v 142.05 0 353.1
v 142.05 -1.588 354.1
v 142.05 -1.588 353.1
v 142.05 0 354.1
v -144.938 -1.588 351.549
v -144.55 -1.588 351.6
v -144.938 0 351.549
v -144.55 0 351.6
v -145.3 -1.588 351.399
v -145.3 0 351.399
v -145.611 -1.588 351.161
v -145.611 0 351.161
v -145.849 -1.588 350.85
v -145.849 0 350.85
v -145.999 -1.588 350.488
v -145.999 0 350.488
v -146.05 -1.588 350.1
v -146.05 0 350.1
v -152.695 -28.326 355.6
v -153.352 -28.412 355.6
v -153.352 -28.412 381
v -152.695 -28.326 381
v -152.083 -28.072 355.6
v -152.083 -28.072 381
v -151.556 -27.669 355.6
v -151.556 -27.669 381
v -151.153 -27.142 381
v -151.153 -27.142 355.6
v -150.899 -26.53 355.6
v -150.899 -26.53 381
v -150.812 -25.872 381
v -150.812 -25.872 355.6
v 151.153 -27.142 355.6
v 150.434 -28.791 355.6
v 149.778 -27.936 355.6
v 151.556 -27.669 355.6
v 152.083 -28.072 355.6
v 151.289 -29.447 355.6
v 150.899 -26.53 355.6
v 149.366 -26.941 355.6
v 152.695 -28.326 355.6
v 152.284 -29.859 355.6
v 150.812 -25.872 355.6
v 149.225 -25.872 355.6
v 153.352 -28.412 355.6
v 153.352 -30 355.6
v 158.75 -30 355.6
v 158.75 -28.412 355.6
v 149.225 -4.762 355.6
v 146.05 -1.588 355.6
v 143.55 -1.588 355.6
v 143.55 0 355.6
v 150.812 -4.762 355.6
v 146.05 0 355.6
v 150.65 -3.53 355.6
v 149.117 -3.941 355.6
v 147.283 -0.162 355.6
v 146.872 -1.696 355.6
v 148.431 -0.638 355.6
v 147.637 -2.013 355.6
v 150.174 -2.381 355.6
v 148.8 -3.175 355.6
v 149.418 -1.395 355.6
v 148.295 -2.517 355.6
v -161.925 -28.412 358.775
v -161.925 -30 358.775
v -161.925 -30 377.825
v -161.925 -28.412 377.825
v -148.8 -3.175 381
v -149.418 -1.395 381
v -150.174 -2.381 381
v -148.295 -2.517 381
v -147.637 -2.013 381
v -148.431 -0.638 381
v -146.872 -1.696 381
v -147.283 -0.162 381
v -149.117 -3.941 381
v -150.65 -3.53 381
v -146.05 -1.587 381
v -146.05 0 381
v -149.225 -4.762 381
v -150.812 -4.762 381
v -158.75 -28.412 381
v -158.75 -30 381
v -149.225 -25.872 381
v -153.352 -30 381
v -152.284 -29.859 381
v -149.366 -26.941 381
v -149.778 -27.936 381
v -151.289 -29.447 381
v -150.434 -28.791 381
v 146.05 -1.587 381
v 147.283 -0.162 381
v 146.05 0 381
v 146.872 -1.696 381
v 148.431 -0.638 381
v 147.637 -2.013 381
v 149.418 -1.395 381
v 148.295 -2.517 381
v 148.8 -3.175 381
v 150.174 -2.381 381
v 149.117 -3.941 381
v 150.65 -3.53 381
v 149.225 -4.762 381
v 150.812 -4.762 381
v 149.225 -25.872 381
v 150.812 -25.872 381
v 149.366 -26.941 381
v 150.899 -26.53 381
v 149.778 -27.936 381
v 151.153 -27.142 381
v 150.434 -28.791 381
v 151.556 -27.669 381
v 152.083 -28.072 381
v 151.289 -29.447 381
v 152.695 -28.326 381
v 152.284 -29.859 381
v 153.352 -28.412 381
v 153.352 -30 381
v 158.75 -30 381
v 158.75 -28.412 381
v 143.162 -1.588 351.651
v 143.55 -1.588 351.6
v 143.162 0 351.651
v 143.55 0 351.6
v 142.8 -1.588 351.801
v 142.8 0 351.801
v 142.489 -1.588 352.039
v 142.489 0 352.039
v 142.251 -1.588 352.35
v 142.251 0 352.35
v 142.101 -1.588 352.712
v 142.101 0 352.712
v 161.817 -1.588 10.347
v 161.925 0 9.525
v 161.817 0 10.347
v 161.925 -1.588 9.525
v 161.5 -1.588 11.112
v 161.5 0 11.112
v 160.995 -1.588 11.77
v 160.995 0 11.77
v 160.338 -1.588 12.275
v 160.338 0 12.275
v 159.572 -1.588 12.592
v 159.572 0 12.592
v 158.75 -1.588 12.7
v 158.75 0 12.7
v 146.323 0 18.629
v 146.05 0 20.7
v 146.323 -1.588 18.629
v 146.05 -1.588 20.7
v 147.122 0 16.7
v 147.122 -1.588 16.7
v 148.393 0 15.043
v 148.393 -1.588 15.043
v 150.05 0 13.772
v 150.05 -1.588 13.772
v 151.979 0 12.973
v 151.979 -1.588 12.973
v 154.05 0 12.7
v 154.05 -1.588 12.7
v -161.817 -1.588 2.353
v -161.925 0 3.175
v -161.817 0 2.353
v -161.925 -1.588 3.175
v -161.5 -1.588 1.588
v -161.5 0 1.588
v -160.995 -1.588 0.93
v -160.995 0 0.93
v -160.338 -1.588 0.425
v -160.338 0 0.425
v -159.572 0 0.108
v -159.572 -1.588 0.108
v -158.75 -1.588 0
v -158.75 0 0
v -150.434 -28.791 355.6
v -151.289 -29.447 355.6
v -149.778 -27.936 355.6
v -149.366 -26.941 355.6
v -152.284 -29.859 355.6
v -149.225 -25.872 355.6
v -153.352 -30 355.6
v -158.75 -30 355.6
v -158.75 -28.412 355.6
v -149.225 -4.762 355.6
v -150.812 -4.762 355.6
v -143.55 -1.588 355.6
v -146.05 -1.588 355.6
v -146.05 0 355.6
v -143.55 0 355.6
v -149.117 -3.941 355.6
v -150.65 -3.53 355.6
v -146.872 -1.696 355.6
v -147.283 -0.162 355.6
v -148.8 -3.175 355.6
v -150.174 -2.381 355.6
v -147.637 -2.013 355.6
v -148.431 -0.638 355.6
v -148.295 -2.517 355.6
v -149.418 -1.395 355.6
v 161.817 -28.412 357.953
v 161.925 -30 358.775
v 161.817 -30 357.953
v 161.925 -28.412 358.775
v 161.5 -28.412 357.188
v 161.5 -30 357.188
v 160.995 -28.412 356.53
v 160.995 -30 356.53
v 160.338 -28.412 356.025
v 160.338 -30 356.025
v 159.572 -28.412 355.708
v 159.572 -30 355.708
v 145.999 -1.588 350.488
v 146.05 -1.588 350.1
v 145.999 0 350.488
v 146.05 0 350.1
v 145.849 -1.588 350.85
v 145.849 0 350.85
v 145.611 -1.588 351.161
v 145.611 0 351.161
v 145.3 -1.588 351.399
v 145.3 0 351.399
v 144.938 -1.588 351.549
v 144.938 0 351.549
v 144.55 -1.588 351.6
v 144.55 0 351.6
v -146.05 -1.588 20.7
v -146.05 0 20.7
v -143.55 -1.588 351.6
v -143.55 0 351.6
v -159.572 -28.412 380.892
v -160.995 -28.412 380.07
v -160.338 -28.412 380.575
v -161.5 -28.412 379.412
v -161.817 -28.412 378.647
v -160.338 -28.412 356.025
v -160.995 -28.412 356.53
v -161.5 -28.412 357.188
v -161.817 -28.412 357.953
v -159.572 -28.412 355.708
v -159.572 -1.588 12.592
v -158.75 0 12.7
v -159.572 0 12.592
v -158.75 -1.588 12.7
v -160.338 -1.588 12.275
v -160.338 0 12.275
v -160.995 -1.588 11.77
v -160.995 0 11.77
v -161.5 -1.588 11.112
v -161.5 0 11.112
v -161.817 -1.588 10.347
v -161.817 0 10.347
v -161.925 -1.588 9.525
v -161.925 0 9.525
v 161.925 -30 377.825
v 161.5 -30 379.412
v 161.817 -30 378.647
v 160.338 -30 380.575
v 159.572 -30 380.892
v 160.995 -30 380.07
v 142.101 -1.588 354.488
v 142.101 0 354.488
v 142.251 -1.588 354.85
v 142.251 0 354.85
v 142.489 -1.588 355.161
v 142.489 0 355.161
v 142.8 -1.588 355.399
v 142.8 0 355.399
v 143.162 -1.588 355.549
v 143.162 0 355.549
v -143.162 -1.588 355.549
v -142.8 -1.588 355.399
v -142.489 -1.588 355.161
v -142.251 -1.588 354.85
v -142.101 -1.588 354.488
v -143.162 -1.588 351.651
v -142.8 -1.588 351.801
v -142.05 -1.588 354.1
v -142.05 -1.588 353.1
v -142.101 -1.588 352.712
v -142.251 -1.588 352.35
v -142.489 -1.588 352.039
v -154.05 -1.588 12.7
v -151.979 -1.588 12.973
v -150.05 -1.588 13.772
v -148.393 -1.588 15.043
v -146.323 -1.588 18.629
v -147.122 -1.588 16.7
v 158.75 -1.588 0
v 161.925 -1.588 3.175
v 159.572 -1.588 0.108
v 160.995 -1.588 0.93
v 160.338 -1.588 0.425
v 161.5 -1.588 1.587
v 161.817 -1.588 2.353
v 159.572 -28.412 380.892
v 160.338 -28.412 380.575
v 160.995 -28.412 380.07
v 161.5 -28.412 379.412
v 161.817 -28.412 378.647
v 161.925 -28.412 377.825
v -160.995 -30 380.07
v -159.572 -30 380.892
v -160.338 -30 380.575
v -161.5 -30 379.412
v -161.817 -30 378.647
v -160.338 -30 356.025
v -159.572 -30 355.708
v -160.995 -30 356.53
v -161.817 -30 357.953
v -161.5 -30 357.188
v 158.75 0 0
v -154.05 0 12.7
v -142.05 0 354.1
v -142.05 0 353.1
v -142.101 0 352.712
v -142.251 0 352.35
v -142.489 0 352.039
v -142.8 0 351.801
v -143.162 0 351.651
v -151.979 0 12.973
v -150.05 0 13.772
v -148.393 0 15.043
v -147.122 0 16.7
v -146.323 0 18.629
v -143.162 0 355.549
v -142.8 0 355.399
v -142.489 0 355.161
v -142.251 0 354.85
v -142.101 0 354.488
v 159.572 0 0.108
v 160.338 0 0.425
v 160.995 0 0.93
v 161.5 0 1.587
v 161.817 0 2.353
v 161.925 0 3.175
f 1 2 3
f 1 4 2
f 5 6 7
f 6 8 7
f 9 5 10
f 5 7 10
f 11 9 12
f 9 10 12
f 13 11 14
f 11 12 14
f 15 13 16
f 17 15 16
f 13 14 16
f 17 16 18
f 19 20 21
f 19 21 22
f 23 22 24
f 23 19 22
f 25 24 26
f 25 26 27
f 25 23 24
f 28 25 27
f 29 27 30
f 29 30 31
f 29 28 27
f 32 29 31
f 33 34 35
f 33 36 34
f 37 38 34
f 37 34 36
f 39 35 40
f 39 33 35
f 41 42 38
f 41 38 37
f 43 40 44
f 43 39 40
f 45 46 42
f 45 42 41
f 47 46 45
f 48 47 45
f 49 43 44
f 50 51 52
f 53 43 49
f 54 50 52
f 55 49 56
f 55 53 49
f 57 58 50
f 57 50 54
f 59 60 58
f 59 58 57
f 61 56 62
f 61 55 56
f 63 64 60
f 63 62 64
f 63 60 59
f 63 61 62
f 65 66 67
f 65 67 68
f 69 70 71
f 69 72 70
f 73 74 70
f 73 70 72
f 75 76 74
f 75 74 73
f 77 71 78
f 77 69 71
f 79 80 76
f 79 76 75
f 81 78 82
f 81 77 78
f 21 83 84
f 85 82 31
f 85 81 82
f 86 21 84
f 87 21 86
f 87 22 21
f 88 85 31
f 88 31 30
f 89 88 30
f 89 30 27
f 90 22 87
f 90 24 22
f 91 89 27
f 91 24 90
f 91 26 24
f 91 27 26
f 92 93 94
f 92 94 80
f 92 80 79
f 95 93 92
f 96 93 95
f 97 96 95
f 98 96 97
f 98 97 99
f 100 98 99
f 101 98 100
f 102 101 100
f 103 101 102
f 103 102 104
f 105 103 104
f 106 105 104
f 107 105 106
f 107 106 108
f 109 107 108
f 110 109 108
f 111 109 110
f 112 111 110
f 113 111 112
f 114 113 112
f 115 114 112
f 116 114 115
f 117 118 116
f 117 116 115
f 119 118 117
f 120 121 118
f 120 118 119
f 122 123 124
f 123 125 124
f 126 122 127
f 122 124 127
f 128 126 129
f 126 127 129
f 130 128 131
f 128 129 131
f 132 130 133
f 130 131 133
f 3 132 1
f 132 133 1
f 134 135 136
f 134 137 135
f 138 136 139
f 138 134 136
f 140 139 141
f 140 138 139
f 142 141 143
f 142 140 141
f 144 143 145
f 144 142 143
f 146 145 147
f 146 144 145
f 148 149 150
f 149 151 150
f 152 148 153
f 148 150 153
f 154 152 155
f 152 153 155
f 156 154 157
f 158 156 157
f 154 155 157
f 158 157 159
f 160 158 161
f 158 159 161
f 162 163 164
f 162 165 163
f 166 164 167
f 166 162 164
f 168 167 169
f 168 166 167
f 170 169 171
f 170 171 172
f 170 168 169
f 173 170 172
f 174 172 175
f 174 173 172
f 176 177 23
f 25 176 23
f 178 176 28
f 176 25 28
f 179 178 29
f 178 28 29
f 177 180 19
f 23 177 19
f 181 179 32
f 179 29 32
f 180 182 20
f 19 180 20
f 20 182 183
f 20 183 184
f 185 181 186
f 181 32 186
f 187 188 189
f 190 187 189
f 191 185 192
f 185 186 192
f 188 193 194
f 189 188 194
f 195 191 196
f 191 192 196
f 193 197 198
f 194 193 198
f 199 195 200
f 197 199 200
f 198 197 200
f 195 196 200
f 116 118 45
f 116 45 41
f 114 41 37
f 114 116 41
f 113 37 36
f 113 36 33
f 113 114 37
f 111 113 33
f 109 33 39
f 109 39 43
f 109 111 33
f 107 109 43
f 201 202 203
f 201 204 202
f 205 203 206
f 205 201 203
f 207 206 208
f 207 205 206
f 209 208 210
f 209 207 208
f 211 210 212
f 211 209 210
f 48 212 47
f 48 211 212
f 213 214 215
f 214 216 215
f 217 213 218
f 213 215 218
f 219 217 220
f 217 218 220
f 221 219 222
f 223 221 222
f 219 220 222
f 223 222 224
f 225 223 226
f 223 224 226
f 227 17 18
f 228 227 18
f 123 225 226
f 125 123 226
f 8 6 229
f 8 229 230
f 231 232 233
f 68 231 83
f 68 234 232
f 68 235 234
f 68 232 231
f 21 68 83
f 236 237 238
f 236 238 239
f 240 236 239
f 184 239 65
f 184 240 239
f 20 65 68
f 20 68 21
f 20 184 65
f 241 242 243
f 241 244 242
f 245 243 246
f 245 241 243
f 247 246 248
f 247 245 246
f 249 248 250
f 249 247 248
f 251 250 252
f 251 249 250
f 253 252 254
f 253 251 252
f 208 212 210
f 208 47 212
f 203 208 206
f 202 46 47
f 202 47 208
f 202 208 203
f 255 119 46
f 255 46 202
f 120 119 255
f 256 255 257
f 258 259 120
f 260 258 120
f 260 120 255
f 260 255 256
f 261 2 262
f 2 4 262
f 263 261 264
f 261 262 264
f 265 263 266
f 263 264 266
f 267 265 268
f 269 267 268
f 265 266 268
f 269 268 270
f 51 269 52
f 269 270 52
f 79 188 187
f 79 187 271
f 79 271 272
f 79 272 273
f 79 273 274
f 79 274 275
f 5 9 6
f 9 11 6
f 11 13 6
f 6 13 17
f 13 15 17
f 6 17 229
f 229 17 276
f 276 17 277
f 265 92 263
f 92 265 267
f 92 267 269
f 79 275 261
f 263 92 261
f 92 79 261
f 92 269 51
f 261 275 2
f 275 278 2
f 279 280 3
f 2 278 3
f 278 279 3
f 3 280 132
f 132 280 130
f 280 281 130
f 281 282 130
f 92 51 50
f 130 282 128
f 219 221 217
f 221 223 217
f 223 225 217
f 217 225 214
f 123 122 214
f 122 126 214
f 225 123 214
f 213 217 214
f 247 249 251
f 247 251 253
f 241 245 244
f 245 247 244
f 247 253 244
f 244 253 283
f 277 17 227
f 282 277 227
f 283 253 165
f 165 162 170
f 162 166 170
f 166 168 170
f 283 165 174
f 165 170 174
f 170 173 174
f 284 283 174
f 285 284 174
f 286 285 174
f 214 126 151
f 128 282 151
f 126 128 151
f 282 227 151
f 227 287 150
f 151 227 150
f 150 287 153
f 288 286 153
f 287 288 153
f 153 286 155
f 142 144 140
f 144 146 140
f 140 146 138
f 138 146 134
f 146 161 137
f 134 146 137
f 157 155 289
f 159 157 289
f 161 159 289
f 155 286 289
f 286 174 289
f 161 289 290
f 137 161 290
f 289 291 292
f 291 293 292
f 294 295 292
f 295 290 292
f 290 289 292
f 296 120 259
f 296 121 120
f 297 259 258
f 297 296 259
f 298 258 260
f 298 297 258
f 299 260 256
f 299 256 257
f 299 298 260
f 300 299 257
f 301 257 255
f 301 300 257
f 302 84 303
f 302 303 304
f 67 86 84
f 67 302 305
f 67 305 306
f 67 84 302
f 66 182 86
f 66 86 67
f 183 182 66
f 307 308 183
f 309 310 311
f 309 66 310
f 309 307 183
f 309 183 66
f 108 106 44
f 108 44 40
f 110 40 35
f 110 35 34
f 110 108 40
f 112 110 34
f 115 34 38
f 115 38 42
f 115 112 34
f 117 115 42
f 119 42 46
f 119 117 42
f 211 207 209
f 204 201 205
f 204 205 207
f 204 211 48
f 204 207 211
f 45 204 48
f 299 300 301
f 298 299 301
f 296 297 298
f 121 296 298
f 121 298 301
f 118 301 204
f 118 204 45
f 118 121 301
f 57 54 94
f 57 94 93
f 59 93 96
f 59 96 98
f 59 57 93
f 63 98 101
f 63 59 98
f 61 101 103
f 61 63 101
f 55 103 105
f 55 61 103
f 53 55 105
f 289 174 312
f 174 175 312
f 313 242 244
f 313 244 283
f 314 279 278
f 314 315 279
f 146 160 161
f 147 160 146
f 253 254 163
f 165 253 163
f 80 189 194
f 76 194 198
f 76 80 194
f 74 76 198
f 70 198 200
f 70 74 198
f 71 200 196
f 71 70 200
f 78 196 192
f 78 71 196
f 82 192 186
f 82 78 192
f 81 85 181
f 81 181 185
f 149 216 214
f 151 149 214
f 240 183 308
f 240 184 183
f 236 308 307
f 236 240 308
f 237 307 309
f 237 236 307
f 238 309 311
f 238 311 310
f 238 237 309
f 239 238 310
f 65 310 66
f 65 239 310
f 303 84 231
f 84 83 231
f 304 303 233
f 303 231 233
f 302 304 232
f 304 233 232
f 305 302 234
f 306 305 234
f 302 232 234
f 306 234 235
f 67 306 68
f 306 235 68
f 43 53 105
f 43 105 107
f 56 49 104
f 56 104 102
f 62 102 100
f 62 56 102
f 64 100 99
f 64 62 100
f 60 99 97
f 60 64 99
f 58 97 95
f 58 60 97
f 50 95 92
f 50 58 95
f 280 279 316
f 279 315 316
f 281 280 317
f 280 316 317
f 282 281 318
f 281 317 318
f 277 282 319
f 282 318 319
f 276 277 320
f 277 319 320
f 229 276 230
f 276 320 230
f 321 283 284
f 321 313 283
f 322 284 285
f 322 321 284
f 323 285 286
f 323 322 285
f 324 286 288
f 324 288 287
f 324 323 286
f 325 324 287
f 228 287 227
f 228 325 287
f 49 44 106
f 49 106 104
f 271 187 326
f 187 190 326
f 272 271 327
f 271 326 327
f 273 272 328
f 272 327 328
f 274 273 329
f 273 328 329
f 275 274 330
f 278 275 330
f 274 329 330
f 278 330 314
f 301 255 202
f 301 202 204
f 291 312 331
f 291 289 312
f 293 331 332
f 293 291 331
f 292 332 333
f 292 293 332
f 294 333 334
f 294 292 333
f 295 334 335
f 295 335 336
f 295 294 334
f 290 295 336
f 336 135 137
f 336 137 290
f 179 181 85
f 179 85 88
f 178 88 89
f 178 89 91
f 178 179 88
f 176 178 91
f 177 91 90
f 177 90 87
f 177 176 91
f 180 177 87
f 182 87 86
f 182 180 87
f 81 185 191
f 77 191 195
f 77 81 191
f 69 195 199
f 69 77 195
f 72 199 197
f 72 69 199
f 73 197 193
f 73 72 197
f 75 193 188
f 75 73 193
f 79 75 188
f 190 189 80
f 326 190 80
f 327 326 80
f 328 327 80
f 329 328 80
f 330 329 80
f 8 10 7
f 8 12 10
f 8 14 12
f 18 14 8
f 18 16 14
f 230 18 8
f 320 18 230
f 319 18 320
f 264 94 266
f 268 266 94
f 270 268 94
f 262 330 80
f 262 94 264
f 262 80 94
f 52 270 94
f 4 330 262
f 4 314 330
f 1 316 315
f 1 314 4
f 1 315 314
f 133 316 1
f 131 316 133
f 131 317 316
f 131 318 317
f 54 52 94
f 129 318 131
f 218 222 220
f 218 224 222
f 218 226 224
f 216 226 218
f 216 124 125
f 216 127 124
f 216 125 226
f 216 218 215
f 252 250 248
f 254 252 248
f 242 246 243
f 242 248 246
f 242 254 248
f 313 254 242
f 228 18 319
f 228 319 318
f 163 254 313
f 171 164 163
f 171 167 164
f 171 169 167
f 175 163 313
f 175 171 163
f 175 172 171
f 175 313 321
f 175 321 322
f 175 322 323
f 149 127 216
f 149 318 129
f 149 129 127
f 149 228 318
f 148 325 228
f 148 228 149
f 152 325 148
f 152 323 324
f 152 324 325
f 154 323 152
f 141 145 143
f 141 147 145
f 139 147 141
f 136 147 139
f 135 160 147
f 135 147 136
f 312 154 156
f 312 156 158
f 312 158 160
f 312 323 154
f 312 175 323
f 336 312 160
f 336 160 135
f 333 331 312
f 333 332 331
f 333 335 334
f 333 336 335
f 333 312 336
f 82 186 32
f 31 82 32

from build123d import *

# Parameters (mm, degrees)
SKETCH5_W                      = 301.625
SKETCH5_H                      = 1.5875
BASE_FLANGE1_DEPTH             = 381
SKETCH10_W                     = 11.1125
SKETCH10_H                     = 12.7
BOSS_EXTRUDE1_DEPTH            = 1.5875
EDGE_FLANGE1_STRIP_W           = 12.7
EDGE_FLANGE1_STRIP_H           = 1.5875
EDGE_FLANGE1_STRIP_CUT_DEPTH   = 368.3
EDGE_FLANGE1_STRIP_2_W         = 12.7
EDGE_FLANGE1_STRIP_2_H         = 1.5875
EDGE_FLANGE1_STRIP_CUT_2_DEPTH = 368.3
EDGE_FLANGE1_DEPTH             = 368.3
EDGE_FLANGE1_BEND_DEPTH        = 368.3
CUT_EXTRUDE1_START             = -25.4
CUT_EXTRUDE1_DEPTH             = 342.9
EDGE_FLANGE2_STRIP_W           = 11.43
EDGE_FLANGE2_STRIP_H           = 1.5875
EDGE_FLANGE2_STRIP_CUT_DEPTH   = 25.4
EDGE_FLANGE2_DEPTH             = 25.4
EDGE_FLANGE3_STRIP_W           = 11.43
EDGE_FLANGE3_STRIP_H           = 1.5875
EDGE_FLANGE3_STRIP_CUT_DEPTH   = 25.4
EDGE_FLANGE3_DEPTH             = 25.4
FILLET1_R                      = 8
FILLET2_R                      = 3.175
SKETCH30_W                     = 4
SKETCH30_H                     = 1.5875
CUT_EXTRUDE9_DEPTH             = 4
SKETCH31_W                     = 4
SKETCH31_H                     = 1.5875
CUT_EXTRUDE10_DEPTH            = 4
FILLET4_R                      = 1.5


# Sheet-metal steps are written as plain solids
with BuildPart() as part:
    # Sketch5 → Base-Flange1 (new body)
    with BuildSketch(Plane.XY):
        with Locations((0, -0.79375)):
            Rectangle(SKETCH5_W, SKETCH5_H)
    extrude(amount=BASE_FLANGE1_DEPTH)

    # Sketch10 → Boss-Extrude1 (add)
    with BuildSketch(Plane(origin=(0, 0, 0), x_dir=(1, 0, 0), z_dir=(0, 1, 0))):
        with Locations((-156.36875, -6.35)):
            Rectangle(SKETCH10_W, SKETCH10_H)
        with Locations((156.36875, -6.35)):
            Rectangle(SKETCH10_W, SKETCH10_H)
    extrude(amount=-BOSS_EXTRUDE1_DEPTH)

    # Edge-Flange1 strip (across the edge) → Edge-Flange1 strip cut (cut)
    with BuildSketch(Plane(origin=(150.8125, -1.5875, 12.7), x_dir=(-1, 0, 0), z_dir=(0, 0, 1))):
        with Locations((-1.5875, -0.79375)):
            Rectangle(EDGE_FLANGE1_STRIP_W, EDGE_FLANGE1_STRIP_H)
    extrude(amount=EDGE_FLANGE1_STRIP_CUT_DEPTH, mode=Mode.SUBTRACT)

    # Edge-Flange1 strip 2 (across the edge) → Edge-Flange1 strip cut 2 (cut)
    with BuildSketch(Plane(origin=(-150.8125, -1.5875, 381), x_dir=(1, 0, 0), z_dir=(0, 0, -1))):
        with Locations((-1.5875, -0.79375)):
            Rectangle(EDGE_FLANGE1_STRIP_2_W, EDGE_FLANGE1_STRIP_2_H)
    extrude(amount=EDGE_FLANGE1_STRIP_CUT_2_DEPTH, mode=Mode.SUBTRACT)

    # Edge-Flange1 section (across the edge) → Edge-Flange1 (add)
    with BuildSketch(Plane(origin=(150.8125, -1.5875, 12.7), x_dir=(-1, 0, 0), z_dir=(0, 0, 1))):
        with BuildLine():
            Line((0, 3.175), (0, 28.4125))
            Line((0, 28.4125), (1.5875, 28.4125))
            Line((1.5875, 28.4125), (1.5875, 3.175))
            ThreePointArc((1.5875, 3.175), (2.51743597, 0.92993597), (4.7625, 0))
            Line((4.7625, 0), (4.7625, -1.5875))
            ThreePointArc((4.7625, -1.5875), (1.394903955, -0.192596045), (0, 3.175))
        make_face()
    extrude(amount=EDGE_FLANGE1_DEPTH)

    # Edge-Flange1 section 2 (across the edge) → Edge-Flange1 bend (add)
    with BuildSketch(Plane(origin=(-150.8125, -1.5875, 381), x_dir=(1, 0, 0), z_dir=(0, 0, -1))):
        with BuildLine():
            Line((0, 3.175), (0, 28.4125))
            Line((0, 28.4125), (1.5875, 28.4125))
            Line((1.5875, 28.4125), (1.5875, 3.175))
            ThreePointArc((1.5875, 3.175), (2.51743597, 0.92993597), (4.7625, 0))
            Line((4.7625, 0), (4.7625, -1.5875))
            ThreePointArc((4.7625, -1.5875), (1.394903955, -0.192596045), (0, 3.175))
        make_face()
    extrude(amount=EDGE_FLANGE1_BEND_DEPTH)

    # Sketch20 → Cut-Extrude1 (cut)
    with BuildSketch(Plane.XY.offset(381).offset(CUT_EXTRUDE1_START)):
        with BuildLine():
            Line((-150.8125, -4.7625), (-150.8125, -30))
            Line((-150.8125, -30), (-149.225, -30))
            Line((-149.225, -30), (-149.225, -4.7625))
            ThreePointArc((-149.225, -4.7625), (-148.29506403, -2.51743597), (-146.05, -1.5875))
            Line((-146.05, -1.5875), (-146.05, 0))
            ThreePointArc((-146.05, 0), (-149.417596045, -1.394903955), (-150.8125, -4.7625))
        make_face()
        with BuildLine():
            Line((149.225, -4.7625), (149.225, -30))
            Line((149.225, -30), (150.8125, -30))
            Line((150.8125, -30), (150.8125, -4.7625))
            ThreePointArc((150.8125, -4.7625), (149.417596045, -1.394903955), (146.05, 0))
            Line((146.05, 0), (146.05, -1.5875))
            ThreePointArc((146.05, -1.5875), (148.29506403, -2.51743597), (149.225, -4.7625))
        make_face()
    extrude(amount=-CUT_EXTRUDE1_DEPTH, mode=Mode.SUBTRACT)

    # Edge-Flange2 strip (across the edge) → Edge-Flange2 strip cut (cut)
    with BuildSketch(Plane(origin=(-150.8125, -30, 355.6), x_dir=(0, 1, 0), z_dir=(0, 0, 1))):
        with Locations((-1.5875, -0.79375)):
            Rectangle(EDGE_FLANGE2_STRIP_W, EDGE_FLANGE2_STRIP_H)
    extrude(amount=EDGE_FLANGE2_STRIP_CUT_DEPTH, mode=Mode.SUBTRACT)

    # Edge-Flange2 section (across the edge) → Edge-Flange2 (add)
    with BuildSketch(Plane(origin=(-150.8125, -30, 355.6), x_dir=(0, 1, 0), z_dir=(0, 0, 1))):
        with BuildLine():
            Line((0, 2.54), (0, 11.1125))
            Line((0, 11.1125), (1.5875, 11.1125))
            Line((1.5875, 11.1125), (1.5875, 2.54))
            ThreePointArc((1.5875, 2.54), (2.331448776, 0.743948776), (4.1275, 0))
            Line((4.1275, 0), (4.1275, -1.5875))
            ThreePointArc((4.1275, -1.5875), (1.208916761, -0.378583239), (0, 2.54))
        make_face()
    extrude(amount=EDGE_FLANGE2_DEPTH)

    # Edge-Flange3 strip (across the edge) → Edge-Flange3 strip cut (cut)
    with BuildSketch(Plane(origin=(150.8125, -30, 381), x_dir=(0, 1, 0), z_dir=(0, 0, -1))):
        with Locations((-1.5875, -0.79375)):
            Rectangle(EDGE_FLANGE3_STRIP_W, EDGE_FLANGE3_STRIP_H)
    extrude(amount=EDGE_FLANGE3_STRIP_CUT_DEPTH, mode=Mode.SUBTRACT)

    # Edge-Flange3 section (across the edge) → Edge-Flange3 (add)
    with BuildSketch(Plane(origin=(150.8125, -30, 381), x_dir=(0, 1, 0), z_dir=(0, 0, -1))):
        with BuildLine():
            Line((0, 2.54), (0, 11.1125))
            Line((0, 11.1125), (1.5875, 11.1125))
            Line((1.5875, 11.1125), (1.5875, 2.54))
            ThreePointArc((1.5875, 2.54), (2.331448776, 0.743948776), (4.1275, 0))
            Line((4.1275, 0), (4.1275, -1.5875))
            ThreePointArc((4.1275, -1.5875), (1.208916761, -0.378583239), (0, 2.54))
        make_face()
    extrude(amount=EDGE_FLANGE3_DEPTH)

    # Fillet1
    fillet1_edges = [part.edges().sort_by_distance(p)[0] for p in [
        (-146.05, -0.79375, 12.7),
        (146.05, -0.79375, 12.7),
    ]]
    fillet(fillet1_edges, radius=FILLET1_R)

    # Fillet2
    fillet2_edges = [part.edges().sort_by_distance(p)[0] for p in [
        (-161.925, -0.79375, 12.7),
        (-161.925, -0.79375, 0),
        (-161.925, -29.20625, 355.6),
        (-161.925, -29.20625, 381),
        (161.925, -29.20625, 381),
        (161.925, -29.20625, 355.6),
        (161.925, -0.79375, 0),
        (161.925, -0.79375, 12.7),
    ]]
    fillet(fillet2_edges, radius=FILLET2_R)

    # Sketch30 → Cut-Extrude9 (cut)
    with BuildSketch(Plane.ZY.offset(146.05)):
        with Locations((353.6, -0.79375)):
            Rectangle(SKETCH30_W, SKETCH30_H)
    extrude(amount=-CUT_EXTRUDE9_DEPTH, mode=Mode.SUBTRACT)

    # Sketch31 → Cut-Extrude10 (cut)
    with BuildSketch(Plane(origin=(146.05, 0, 0), x_dir=(0, 0, -1), z_dir=(1, 0, 0))):
        with Locations((-353.6, -0.79375)):
            Rectangle(SKETCH31_W, SKETCH31_H)
    extrude(amount=-CUT_EXTRUDE10_DEPTH, mode=Mode.SUBTRACT)

    # Fillet4
    fillet4_edges = [part.edges().sort_by_distance(p)[0] for p in [
        (-146.05, -0.79375, 351.6),
        (-142.05, -0.79375, 351.6),
        (-142.05, -0.79375, 355.6),
        (146.05, -0.79375, 351.6),
        (142.05, -0.79375, 351.6),
        (142.05, -0.79375, 355.6),
    ]]
    fillet(fillet4_edges, radius=FILLET4_R)


solid = part.part
